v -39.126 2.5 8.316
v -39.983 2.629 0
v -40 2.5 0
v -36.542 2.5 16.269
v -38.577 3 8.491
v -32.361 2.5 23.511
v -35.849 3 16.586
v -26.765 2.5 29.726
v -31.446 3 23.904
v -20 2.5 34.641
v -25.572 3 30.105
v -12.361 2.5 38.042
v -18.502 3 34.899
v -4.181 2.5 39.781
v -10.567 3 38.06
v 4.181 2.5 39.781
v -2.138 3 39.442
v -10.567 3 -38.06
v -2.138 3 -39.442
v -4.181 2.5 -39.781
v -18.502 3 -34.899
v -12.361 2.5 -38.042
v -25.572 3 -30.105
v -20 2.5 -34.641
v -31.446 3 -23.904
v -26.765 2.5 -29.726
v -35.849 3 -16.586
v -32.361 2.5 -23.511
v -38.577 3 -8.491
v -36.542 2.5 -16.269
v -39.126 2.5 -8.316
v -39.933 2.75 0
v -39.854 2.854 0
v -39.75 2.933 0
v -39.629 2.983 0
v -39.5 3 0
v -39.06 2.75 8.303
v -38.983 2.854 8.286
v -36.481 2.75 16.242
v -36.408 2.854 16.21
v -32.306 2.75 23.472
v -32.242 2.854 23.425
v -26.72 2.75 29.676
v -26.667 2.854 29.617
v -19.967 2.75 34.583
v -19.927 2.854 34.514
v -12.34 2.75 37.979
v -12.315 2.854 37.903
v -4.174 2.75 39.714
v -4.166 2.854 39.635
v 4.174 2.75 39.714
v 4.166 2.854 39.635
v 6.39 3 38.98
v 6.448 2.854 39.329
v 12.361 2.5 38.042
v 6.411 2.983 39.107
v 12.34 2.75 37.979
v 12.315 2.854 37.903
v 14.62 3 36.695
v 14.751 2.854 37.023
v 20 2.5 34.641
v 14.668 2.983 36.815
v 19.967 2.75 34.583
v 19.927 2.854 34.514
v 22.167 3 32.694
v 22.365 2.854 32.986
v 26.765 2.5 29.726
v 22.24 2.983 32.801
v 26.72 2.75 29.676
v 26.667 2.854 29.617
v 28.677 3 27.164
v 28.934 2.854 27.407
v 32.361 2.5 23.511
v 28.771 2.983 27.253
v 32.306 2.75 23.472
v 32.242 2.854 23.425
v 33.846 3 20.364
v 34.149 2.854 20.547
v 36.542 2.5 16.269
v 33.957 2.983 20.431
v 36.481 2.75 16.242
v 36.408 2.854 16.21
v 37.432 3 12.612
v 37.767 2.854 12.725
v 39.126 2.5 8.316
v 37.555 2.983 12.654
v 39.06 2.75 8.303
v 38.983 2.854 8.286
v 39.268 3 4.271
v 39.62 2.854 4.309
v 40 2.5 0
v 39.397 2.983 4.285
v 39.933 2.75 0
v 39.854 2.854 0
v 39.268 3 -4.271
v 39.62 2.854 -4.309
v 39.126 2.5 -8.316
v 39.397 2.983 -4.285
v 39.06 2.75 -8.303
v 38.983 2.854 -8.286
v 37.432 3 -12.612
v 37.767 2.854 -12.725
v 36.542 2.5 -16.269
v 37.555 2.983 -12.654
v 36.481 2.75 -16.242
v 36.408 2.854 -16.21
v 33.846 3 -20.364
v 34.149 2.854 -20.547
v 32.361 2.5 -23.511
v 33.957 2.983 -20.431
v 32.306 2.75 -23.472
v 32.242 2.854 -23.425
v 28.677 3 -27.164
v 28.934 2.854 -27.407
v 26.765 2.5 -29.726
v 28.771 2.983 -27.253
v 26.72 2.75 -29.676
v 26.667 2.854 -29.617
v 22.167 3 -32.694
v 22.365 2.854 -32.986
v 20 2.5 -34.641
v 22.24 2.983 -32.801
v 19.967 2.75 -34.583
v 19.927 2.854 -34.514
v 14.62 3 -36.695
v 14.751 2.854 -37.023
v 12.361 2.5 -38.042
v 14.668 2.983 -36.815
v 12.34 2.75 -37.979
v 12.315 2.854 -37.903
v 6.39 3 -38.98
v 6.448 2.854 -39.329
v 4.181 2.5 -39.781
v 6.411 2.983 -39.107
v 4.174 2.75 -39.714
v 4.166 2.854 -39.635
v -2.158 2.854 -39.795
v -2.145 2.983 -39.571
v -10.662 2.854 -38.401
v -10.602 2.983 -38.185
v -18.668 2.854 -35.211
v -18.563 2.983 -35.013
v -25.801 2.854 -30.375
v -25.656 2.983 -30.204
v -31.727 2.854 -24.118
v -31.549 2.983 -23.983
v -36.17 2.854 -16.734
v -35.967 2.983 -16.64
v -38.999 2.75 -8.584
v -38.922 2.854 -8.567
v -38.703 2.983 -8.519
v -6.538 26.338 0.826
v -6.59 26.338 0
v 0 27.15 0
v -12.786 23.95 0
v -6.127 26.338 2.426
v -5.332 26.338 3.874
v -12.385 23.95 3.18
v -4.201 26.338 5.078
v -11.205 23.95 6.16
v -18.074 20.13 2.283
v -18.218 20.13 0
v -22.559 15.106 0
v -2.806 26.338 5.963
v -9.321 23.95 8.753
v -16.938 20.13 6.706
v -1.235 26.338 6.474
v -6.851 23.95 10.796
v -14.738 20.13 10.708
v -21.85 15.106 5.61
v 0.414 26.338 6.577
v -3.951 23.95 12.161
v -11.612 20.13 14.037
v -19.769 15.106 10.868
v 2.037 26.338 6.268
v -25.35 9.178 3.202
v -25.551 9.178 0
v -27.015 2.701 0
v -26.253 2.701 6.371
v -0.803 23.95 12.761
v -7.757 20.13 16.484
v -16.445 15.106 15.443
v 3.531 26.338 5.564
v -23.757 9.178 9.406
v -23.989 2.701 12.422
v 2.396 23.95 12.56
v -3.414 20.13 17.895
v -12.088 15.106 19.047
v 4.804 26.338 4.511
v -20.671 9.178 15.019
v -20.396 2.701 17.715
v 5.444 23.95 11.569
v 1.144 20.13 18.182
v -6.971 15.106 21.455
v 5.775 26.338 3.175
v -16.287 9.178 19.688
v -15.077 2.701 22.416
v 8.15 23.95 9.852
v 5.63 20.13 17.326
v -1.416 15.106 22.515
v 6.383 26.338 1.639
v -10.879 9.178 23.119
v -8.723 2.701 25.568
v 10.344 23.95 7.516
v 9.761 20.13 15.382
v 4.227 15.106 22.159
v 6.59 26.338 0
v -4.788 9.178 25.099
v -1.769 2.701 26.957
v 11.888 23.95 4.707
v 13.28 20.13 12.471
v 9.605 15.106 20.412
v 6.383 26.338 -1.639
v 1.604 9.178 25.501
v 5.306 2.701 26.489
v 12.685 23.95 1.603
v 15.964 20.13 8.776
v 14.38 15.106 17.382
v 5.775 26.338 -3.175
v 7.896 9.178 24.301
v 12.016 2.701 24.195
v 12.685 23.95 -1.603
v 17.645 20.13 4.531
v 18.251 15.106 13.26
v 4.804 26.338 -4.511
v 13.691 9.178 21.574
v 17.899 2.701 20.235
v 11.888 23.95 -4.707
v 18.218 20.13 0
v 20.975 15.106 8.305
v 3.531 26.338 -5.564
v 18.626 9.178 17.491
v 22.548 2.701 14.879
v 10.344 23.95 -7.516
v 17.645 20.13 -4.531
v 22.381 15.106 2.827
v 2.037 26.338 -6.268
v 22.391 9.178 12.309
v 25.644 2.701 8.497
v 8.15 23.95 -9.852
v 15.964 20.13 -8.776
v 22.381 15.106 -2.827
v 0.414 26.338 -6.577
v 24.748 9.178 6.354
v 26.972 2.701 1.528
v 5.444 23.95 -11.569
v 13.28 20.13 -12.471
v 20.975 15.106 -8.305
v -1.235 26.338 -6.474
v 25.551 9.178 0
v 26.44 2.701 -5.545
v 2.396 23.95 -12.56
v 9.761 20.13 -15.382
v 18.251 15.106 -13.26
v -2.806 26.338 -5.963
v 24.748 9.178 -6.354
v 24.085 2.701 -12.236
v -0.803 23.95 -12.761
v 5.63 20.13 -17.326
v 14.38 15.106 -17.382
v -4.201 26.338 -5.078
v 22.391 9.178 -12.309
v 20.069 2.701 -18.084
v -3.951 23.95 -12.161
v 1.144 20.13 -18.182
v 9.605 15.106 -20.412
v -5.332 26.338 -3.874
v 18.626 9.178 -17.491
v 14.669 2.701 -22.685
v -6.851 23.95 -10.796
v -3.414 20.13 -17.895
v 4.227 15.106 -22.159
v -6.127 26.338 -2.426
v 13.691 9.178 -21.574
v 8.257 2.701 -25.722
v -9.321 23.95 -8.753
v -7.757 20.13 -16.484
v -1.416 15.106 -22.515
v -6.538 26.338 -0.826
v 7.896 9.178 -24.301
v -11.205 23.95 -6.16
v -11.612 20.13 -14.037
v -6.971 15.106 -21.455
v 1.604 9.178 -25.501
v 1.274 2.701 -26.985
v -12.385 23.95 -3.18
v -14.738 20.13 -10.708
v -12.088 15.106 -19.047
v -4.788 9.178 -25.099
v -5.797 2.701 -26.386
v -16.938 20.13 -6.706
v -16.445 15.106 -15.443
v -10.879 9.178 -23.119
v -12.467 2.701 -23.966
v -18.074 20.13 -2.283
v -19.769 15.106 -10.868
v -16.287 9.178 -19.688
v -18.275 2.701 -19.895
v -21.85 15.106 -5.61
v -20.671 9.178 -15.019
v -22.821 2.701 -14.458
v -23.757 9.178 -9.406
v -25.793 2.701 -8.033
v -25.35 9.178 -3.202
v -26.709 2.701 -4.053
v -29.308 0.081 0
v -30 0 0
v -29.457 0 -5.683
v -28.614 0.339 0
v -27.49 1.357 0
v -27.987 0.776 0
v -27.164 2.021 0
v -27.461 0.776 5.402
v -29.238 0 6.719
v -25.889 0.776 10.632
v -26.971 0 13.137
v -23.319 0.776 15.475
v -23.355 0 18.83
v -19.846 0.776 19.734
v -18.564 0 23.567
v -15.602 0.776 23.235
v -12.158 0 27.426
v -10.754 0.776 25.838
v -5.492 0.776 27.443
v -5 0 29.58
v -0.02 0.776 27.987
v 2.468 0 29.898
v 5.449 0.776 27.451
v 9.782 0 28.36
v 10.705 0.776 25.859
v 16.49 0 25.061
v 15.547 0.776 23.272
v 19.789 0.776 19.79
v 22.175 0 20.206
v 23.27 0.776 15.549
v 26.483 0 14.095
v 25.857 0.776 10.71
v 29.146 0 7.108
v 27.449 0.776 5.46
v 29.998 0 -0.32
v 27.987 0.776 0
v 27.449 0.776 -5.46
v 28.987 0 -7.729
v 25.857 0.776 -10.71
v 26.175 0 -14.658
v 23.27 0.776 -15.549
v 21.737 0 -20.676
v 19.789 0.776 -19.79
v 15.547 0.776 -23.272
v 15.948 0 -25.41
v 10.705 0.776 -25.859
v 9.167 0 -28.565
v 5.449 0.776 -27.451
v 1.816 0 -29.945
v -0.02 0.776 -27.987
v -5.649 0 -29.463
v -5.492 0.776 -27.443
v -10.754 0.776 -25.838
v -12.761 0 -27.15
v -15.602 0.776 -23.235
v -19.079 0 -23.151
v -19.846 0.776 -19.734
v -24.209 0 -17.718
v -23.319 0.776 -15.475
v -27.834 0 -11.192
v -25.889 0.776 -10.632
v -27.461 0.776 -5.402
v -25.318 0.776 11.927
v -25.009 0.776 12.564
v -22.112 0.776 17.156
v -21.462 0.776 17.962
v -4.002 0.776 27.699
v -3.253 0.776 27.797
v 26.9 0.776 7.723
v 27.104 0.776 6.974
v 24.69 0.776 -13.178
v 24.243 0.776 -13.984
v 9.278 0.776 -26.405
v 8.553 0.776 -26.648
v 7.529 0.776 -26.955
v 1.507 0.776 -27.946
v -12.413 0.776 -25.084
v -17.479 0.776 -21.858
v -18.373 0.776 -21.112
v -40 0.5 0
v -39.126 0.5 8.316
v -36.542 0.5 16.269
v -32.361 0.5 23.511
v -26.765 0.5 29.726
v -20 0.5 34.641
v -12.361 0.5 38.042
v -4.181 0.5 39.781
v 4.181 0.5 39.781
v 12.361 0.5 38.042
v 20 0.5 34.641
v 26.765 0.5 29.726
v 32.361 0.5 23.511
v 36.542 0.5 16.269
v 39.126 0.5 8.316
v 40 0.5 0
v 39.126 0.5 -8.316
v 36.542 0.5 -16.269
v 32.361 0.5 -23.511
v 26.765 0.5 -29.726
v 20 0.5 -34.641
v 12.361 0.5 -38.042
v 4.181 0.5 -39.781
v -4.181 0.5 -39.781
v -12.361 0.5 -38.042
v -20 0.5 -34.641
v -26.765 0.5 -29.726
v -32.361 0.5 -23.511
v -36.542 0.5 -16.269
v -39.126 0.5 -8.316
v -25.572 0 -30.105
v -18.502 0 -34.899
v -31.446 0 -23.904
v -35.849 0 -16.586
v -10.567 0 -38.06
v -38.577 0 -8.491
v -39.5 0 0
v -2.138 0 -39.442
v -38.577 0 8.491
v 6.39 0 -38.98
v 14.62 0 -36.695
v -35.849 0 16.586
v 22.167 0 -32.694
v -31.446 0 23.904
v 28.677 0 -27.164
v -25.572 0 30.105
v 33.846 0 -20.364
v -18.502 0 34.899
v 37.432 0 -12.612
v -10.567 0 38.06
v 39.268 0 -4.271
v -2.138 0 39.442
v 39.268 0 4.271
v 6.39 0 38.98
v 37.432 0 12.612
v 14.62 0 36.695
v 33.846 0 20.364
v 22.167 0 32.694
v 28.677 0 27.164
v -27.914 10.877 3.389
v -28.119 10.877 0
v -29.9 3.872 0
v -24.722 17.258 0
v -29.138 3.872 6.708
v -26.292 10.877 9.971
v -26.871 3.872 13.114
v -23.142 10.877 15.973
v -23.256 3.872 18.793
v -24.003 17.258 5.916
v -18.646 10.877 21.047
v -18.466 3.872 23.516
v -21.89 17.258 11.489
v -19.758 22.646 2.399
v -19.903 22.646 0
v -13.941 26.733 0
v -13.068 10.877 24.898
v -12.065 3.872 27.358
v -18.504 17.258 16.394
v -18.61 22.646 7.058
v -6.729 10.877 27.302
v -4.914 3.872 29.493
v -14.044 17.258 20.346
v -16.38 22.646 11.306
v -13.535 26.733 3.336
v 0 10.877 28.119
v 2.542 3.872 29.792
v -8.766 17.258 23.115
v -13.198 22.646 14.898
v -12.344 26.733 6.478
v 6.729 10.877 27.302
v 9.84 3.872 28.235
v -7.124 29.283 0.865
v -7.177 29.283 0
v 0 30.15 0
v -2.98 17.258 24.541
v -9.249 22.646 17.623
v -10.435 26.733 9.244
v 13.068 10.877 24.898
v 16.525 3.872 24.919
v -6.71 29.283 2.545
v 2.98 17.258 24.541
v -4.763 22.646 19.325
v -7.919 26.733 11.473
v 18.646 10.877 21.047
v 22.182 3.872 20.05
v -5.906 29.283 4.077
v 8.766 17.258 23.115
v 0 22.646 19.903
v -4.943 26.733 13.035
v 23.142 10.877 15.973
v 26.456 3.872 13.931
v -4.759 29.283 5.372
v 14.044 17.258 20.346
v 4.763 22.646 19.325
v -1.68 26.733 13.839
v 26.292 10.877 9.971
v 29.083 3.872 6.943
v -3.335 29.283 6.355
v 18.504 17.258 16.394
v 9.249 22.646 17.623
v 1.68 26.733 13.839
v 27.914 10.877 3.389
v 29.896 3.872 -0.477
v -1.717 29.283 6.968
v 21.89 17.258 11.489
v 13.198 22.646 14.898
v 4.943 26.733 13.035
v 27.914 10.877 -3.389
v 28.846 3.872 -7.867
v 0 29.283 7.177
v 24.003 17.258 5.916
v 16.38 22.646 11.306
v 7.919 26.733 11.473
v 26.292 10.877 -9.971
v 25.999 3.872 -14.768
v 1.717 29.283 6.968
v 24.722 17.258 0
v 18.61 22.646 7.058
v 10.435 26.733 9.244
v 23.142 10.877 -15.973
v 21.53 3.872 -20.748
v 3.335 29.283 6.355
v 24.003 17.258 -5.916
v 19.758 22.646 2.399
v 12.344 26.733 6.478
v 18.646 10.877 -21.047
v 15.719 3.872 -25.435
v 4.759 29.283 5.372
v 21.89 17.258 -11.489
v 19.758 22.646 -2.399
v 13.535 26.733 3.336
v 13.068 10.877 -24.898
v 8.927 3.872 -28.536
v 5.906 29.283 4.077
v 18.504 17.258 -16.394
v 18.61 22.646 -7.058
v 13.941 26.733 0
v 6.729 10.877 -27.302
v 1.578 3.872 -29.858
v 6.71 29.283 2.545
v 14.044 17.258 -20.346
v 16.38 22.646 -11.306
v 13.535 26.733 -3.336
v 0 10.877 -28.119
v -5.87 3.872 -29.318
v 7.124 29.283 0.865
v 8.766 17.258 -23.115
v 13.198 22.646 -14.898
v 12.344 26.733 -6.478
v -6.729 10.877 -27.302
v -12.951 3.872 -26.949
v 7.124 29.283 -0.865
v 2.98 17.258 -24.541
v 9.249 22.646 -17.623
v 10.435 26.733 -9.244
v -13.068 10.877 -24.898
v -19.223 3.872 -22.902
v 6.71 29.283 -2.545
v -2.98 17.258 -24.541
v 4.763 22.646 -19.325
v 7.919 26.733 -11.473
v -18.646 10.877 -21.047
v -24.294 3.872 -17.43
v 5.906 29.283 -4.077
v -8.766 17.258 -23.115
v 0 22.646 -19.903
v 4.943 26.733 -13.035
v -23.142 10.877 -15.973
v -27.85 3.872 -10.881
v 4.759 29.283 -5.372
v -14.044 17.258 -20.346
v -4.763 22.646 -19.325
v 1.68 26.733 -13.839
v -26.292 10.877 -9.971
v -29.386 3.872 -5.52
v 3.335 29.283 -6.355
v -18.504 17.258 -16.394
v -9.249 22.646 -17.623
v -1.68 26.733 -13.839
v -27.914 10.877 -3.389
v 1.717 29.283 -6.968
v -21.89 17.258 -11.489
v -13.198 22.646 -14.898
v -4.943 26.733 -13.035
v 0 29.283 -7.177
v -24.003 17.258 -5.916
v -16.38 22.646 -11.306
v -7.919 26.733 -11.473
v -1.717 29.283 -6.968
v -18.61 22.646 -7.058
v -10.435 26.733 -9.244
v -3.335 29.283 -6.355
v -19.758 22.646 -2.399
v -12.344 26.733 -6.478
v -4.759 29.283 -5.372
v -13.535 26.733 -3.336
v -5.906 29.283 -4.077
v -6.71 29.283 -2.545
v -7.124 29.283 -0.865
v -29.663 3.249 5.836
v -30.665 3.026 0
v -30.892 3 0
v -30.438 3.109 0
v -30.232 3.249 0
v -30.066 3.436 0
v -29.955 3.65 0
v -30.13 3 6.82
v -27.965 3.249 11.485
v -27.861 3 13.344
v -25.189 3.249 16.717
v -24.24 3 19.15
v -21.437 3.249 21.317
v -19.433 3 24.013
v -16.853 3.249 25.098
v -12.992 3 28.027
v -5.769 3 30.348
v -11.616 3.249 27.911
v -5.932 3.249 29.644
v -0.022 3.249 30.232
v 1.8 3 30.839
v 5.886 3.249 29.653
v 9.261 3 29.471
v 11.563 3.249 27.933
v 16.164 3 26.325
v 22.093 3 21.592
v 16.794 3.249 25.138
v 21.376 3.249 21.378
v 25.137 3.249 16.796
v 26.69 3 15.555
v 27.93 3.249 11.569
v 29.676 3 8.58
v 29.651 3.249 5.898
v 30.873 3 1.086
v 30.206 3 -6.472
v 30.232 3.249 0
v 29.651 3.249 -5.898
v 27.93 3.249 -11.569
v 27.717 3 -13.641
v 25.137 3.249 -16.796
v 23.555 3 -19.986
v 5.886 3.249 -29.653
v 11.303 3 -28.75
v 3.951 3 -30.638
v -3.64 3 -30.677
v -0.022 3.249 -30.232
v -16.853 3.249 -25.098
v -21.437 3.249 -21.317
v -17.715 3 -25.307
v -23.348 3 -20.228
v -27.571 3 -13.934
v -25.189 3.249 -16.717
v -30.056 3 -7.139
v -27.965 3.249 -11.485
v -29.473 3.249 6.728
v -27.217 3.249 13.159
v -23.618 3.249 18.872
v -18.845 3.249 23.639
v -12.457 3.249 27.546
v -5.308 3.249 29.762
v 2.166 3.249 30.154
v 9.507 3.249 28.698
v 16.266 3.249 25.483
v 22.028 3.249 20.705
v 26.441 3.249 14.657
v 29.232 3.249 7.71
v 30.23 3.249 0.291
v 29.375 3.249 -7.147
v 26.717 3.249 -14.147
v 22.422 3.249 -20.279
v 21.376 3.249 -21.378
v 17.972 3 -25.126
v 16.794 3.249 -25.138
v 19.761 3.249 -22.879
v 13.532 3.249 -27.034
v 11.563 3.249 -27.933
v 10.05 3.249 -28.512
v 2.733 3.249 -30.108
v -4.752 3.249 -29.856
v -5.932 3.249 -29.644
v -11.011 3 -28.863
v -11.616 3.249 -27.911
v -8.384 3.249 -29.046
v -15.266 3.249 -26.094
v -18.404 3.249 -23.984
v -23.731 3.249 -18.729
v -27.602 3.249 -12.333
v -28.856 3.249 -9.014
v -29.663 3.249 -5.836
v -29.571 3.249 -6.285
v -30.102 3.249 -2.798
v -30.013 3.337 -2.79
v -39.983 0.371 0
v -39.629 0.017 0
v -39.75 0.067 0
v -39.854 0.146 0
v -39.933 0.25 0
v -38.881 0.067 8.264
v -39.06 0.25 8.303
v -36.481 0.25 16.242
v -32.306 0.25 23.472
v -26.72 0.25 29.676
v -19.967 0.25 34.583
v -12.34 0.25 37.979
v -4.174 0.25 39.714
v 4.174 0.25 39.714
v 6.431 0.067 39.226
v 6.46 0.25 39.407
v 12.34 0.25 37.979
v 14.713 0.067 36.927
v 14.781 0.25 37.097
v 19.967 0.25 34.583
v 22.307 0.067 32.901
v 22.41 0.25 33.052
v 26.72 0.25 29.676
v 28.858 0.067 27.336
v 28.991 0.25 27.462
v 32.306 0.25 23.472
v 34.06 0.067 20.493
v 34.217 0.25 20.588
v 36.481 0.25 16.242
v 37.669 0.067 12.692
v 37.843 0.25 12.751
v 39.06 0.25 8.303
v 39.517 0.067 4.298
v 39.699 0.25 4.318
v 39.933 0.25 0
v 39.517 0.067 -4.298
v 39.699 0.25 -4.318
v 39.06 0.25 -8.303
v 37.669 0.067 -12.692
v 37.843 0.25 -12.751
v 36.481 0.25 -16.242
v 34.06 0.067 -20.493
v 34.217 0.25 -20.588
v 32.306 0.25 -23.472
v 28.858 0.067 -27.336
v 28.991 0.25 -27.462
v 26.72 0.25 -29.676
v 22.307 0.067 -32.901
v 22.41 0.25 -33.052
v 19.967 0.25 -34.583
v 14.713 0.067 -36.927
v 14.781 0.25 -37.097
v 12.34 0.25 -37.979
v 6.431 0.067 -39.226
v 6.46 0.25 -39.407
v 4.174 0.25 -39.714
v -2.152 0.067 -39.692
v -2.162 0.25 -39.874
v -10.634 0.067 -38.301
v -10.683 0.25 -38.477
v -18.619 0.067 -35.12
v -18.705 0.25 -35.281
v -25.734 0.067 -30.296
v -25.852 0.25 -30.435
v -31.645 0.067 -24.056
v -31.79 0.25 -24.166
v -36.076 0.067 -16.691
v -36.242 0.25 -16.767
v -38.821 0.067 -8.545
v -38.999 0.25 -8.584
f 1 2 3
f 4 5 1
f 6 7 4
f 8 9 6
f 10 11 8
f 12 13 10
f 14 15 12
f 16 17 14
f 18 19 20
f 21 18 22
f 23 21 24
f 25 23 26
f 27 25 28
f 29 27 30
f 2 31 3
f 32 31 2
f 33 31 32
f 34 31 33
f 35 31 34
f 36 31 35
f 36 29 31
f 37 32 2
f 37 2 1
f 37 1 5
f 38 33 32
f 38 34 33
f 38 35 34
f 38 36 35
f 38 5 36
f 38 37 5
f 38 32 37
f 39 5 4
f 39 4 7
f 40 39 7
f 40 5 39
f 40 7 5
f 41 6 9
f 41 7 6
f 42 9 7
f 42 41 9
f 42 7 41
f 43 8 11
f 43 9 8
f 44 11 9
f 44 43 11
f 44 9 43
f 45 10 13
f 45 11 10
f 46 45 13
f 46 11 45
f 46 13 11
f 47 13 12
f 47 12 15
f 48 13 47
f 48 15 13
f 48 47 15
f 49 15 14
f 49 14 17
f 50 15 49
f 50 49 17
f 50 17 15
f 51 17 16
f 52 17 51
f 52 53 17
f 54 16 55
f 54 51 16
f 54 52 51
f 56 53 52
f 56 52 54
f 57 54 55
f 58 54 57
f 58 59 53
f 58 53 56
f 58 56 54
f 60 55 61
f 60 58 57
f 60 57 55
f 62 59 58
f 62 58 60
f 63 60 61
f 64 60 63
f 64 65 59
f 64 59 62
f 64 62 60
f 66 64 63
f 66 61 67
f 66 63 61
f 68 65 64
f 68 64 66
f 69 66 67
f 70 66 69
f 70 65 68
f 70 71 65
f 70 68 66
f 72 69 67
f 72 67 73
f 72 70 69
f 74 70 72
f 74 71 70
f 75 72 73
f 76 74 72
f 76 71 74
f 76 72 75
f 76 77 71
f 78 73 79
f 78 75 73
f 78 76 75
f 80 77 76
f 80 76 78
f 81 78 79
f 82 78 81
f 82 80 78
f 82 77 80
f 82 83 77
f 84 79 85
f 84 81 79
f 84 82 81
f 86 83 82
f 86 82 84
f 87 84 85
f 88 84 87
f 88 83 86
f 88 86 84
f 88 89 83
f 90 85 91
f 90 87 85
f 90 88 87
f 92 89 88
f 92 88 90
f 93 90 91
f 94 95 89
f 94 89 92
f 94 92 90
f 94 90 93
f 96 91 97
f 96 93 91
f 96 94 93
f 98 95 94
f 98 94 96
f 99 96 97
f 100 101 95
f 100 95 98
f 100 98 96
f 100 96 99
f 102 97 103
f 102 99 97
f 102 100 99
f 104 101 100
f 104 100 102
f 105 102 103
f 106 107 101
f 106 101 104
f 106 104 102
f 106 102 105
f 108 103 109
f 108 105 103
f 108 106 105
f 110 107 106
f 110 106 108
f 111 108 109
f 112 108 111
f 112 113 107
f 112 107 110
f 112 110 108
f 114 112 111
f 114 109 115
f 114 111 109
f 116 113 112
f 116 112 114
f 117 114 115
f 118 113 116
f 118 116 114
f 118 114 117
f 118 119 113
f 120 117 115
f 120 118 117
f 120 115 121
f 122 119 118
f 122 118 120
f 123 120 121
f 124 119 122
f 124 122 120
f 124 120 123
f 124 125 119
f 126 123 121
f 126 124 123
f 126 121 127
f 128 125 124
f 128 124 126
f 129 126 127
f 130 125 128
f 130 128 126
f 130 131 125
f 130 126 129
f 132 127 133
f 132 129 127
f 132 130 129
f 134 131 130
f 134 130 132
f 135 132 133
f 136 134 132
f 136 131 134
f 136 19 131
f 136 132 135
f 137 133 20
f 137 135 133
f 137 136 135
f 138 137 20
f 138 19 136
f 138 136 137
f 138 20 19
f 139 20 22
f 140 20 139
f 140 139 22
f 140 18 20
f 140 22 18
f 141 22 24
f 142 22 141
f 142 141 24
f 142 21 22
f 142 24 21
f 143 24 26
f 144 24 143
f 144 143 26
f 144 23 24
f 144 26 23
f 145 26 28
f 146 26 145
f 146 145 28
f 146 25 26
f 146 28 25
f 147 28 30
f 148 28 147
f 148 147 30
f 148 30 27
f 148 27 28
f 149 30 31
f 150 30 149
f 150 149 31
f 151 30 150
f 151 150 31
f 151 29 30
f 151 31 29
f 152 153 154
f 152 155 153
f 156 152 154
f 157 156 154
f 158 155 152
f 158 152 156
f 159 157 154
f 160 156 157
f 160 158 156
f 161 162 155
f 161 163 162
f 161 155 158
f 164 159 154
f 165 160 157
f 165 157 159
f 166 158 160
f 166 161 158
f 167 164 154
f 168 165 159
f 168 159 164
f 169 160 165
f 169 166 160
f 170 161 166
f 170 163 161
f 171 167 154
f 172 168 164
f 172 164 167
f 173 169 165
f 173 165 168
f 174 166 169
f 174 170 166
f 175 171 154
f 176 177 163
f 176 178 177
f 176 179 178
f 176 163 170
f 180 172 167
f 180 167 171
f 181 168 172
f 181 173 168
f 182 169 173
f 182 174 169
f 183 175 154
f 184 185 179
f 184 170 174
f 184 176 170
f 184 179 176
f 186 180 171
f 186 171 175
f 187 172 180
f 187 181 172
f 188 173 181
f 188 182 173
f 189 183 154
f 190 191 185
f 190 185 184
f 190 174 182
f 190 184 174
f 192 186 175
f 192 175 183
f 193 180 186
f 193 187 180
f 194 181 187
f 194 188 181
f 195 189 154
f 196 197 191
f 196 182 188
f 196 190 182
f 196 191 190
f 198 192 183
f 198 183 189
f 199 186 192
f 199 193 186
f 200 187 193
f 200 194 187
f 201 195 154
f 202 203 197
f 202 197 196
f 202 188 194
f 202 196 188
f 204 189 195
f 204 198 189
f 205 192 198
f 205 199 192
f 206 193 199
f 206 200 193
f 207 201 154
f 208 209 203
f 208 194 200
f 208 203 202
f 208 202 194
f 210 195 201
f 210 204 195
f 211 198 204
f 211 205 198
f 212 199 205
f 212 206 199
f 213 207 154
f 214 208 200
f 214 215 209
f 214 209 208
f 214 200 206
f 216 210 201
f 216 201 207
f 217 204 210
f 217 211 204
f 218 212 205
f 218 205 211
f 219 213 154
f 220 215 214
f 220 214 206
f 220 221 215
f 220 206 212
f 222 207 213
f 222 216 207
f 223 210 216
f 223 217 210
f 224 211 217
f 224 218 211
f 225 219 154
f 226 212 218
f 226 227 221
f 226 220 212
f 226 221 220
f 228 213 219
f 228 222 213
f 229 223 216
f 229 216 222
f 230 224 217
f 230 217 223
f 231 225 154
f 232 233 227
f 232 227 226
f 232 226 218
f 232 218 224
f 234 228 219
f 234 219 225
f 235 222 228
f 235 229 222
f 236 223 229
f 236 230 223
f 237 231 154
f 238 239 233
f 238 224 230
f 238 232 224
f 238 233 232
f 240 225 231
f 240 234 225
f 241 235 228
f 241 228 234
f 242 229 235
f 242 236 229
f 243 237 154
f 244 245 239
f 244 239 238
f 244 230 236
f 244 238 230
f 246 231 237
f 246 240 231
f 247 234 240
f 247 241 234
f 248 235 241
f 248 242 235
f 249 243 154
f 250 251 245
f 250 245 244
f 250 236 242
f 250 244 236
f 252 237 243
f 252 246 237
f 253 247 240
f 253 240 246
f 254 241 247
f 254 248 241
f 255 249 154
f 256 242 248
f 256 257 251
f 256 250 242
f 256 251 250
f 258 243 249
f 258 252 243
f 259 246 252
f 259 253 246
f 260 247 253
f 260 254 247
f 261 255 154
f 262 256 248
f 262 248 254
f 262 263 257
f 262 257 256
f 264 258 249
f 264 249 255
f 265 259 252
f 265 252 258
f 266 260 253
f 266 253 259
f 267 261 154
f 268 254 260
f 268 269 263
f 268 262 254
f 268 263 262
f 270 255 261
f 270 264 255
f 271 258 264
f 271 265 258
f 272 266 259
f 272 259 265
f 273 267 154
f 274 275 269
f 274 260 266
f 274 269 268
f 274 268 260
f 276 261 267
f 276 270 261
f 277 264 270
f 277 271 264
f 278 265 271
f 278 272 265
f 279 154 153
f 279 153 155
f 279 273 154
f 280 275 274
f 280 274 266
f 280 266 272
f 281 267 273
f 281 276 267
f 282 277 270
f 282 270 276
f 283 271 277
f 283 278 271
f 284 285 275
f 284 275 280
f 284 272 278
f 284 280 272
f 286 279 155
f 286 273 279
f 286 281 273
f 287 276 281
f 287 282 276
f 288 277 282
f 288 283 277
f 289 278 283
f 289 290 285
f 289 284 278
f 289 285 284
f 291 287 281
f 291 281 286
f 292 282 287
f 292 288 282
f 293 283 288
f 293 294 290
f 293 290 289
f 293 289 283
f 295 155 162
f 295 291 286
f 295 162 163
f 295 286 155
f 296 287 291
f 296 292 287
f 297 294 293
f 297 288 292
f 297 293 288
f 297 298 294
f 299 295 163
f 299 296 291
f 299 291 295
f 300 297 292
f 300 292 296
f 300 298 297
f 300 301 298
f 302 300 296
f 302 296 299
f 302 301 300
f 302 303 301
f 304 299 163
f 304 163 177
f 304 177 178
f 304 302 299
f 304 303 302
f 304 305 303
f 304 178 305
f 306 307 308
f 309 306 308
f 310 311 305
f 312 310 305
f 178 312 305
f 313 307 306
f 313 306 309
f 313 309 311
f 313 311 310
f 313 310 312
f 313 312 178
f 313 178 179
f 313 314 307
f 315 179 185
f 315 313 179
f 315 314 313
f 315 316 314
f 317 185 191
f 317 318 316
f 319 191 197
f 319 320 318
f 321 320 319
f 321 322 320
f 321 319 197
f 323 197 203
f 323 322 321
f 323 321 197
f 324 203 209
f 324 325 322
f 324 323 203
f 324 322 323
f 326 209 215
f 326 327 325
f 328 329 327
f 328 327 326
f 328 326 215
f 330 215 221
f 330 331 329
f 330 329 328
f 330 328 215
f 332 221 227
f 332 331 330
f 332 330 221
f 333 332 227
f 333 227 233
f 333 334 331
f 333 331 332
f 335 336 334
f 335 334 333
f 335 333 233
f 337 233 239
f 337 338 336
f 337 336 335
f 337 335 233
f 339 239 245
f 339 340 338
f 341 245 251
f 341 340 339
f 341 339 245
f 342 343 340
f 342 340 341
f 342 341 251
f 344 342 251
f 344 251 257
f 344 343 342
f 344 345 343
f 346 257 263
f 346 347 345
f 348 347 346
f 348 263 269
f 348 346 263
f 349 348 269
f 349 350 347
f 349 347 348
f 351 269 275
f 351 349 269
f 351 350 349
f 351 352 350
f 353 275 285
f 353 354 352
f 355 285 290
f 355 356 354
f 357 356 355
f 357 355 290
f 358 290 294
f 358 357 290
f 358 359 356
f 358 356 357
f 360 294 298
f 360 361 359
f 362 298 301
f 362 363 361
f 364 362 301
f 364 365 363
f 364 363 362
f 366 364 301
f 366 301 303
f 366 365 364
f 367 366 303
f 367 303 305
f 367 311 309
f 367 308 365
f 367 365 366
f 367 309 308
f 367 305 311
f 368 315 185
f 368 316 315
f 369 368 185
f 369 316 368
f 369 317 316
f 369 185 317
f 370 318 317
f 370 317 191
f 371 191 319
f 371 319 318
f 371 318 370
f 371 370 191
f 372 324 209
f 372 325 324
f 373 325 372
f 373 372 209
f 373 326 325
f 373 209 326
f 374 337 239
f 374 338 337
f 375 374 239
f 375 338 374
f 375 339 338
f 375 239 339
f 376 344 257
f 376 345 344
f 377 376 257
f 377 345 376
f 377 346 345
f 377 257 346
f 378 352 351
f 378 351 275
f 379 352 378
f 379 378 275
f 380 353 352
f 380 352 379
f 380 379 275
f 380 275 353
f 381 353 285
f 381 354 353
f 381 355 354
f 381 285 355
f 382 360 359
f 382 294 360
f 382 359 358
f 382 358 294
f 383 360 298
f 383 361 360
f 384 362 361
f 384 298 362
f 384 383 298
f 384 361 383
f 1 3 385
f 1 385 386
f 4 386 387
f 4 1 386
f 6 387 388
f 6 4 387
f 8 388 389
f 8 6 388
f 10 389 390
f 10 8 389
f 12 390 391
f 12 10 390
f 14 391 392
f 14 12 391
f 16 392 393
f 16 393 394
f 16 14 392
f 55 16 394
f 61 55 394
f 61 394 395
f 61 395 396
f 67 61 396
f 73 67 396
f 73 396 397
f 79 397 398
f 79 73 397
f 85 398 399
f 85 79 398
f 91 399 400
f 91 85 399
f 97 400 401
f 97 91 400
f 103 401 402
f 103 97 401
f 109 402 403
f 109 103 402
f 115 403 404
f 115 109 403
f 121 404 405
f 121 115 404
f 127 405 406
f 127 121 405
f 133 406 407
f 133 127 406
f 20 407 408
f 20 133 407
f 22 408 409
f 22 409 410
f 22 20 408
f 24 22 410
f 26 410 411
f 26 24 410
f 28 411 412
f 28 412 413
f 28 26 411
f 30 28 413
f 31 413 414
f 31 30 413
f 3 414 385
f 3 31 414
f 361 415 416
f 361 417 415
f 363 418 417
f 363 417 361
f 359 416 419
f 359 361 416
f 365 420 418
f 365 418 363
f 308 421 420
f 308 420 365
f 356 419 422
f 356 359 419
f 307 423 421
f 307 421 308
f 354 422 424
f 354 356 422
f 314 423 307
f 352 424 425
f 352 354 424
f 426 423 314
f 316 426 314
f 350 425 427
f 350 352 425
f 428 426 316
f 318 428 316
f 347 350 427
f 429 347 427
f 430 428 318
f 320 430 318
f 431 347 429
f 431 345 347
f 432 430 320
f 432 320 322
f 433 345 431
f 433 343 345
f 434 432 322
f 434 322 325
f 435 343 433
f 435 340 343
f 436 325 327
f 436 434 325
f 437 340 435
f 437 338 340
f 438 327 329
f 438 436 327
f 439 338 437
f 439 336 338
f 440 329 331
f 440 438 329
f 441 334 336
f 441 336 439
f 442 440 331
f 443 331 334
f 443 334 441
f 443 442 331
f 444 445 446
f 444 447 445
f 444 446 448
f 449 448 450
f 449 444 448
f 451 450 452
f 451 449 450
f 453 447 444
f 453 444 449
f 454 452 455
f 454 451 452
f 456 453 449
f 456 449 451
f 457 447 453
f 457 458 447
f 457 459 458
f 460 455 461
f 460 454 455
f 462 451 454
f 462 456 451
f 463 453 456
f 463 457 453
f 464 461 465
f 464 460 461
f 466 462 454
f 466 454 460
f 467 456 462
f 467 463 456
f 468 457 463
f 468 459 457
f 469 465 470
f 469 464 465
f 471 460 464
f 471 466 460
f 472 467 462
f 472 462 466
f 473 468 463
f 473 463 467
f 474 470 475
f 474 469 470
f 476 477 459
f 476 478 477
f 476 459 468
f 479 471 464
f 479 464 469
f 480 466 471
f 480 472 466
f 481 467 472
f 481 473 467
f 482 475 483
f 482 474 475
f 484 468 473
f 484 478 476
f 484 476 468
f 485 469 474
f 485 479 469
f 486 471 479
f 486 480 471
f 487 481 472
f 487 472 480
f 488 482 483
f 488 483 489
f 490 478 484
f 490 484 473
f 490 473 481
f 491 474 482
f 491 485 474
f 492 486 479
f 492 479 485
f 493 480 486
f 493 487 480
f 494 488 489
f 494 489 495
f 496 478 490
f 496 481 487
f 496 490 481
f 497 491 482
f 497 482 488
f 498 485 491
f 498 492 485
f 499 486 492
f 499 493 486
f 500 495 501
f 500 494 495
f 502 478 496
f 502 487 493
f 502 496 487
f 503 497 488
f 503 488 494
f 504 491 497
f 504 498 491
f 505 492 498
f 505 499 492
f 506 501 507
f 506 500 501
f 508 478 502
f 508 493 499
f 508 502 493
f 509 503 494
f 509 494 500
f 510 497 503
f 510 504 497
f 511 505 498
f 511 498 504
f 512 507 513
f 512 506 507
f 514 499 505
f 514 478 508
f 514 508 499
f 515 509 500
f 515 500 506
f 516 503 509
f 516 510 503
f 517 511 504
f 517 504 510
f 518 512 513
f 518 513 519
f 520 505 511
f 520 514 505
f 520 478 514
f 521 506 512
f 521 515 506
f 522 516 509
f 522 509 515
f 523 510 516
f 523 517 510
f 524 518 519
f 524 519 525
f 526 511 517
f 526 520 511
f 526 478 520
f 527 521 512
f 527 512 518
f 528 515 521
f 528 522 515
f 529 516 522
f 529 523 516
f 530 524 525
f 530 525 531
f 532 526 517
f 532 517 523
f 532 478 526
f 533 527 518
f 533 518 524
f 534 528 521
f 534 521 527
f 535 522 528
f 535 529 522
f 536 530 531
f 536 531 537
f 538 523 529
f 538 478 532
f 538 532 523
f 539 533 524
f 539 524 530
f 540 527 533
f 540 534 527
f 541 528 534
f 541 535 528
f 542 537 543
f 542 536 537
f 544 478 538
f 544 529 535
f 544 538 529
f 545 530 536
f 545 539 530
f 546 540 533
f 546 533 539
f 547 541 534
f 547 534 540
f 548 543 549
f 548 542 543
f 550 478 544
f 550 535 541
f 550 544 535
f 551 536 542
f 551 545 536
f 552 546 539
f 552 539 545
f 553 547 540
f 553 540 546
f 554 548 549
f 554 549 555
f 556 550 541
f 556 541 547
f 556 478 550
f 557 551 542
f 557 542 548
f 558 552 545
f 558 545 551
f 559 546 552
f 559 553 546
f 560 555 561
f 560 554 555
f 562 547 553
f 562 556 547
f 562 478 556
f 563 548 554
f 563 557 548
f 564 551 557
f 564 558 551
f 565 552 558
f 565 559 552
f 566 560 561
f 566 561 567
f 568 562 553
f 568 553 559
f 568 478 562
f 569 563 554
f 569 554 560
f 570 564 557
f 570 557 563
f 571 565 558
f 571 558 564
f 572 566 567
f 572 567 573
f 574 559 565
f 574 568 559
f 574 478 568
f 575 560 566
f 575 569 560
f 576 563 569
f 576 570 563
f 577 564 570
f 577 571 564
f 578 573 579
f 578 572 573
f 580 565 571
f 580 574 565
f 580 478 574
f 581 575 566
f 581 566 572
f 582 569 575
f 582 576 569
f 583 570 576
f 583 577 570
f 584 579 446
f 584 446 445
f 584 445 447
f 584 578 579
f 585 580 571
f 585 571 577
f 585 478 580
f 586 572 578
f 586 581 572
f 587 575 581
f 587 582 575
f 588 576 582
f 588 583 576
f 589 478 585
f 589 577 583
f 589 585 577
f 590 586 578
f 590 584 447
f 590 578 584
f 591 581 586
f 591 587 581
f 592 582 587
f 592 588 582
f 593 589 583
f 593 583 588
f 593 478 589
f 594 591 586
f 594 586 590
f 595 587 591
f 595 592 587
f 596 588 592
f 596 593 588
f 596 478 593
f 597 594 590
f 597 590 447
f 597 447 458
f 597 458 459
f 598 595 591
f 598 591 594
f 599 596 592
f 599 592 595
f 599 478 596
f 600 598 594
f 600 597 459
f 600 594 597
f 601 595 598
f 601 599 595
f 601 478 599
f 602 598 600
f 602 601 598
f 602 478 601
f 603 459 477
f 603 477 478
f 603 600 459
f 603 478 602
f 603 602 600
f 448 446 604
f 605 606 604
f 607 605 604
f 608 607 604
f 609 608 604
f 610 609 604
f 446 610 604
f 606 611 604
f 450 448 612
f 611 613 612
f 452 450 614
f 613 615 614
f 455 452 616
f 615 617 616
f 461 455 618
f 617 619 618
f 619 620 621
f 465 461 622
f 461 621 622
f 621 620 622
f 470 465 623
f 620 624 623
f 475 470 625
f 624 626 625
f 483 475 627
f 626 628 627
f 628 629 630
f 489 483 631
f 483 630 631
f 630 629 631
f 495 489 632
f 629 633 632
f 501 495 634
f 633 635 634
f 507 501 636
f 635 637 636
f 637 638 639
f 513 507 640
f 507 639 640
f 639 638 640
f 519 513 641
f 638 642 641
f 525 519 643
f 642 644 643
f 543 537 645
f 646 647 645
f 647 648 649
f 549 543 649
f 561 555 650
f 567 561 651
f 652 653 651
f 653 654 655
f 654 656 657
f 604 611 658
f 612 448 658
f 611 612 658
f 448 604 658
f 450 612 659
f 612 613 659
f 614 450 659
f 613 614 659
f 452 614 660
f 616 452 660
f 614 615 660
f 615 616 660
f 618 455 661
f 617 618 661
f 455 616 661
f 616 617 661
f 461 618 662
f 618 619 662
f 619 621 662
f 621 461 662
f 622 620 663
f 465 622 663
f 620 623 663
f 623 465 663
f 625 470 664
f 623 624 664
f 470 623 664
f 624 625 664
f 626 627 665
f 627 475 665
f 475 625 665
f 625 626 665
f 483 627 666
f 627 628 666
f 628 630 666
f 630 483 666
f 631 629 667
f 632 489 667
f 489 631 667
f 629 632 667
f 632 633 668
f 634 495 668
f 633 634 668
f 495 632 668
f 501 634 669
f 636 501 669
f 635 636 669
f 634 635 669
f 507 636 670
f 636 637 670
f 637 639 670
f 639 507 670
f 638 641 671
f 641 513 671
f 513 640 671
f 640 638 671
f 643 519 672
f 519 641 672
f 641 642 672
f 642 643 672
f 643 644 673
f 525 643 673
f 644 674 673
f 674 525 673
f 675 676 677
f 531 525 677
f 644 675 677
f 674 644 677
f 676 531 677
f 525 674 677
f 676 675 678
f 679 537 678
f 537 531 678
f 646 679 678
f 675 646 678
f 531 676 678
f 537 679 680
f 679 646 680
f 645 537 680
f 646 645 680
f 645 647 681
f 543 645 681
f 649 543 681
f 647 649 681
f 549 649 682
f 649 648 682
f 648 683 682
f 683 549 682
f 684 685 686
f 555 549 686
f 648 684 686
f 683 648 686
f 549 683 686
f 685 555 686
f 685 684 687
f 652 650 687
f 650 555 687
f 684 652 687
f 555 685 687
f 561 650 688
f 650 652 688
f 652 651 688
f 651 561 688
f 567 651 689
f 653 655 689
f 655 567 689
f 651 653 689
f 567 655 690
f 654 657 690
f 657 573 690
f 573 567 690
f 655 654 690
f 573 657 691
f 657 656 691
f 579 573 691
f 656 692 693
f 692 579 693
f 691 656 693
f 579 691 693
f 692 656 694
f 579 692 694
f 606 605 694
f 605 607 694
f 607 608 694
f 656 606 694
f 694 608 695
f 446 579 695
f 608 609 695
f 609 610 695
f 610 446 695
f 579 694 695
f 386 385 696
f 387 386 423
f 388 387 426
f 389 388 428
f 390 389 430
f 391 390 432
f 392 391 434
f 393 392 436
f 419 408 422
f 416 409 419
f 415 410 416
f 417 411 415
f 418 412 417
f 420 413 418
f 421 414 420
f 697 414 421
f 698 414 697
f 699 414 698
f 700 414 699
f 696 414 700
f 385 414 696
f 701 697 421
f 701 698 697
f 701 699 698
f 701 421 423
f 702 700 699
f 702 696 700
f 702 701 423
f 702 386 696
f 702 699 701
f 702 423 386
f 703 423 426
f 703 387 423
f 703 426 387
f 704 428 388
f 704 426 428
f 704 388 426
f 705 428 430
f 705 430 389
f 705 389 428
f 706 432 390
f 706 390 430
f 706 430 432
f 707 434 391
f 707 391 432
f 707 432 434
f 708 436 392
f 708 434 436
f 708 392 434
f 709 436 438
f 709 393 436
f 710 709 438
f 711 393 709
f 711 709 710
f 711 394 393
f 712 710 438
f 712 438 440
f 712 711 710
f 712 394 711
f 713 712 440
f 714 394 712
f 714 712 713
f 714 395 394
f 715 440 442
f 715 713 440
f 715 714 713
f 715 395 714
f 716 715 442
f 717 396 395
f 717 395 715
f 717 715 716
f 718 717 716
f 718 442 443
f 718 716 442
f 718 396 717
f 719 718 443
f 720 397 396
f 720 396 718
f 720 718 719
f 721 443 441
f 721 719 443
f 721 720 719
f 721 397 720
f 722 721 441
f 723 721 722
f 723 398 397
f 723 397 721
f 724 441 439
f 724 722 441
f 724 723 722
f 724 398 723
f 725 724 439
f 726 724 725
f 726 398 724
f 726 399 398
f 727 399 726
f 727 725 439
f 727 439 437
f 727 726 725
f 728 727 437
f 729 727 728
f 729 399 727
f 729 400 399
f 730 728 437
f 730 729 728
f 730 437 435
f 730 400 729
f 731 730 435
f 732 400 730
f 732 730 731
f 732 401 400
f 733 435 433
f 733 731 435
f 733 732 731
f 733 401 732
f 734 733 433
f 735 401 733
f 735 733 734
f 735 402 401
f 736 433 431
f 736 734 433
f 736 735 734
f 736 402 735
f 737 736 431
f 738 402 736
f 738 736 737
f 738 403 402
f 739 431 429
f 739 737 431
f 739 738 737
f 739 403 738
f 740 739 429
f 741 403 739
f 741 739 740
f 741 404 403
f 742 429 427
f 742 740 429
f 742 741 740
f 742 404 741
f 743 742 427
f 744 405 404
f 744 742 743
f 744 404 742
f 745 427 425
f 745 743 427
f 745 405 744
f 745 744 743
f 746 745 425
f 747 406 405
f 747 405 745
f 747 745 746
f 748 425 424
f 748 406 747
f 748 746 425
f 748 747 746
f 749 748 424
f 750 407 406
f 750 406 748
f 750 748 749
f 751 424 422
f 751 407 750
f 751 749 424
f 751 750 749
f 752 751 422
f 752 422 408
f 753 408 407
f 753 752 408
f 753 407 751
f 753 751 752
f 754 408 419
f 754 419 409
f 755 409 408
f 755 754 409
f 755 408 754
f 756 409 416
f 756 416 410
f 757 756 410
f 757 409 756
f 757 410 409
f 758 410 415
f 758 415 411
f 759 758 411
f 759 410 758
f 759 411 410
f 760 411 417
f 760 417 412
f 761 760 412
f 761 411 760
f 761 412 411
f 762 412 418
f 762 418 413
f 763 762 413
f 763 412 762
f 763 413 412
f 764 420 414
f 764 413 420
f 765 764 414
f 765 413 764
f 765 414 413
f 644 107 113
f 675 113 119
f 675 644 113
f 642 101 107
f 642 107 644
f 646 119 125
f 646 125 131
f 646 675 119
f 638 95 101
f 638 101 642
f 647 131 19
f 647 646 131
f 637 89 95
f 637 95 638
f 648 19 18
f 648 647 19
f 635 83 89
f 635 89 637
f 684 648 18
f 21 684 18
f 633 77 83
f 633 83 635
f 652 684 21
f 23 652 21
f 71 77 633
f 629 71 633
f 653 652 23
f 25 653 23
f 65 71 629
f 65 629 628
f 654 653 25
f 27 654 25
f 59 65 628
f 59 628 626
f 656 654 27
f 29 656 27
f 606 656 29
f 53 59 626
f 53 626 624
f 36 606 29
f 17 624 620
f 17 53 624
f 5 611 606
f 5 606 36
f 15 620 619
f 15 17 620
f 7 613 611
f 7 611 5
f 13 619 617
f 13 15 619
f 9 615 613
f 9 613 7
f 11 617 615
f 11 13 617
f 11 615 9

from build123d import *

# Parameters (mm, degrees)
FILLET_1_R = 1
FILLET_2_R = 3
FILLET_3_R = 0.5


with BuildPart() as part:
    # 草图1 → 旋转4 (revolve)
    with BuildSketch(Plane.XY):
        with BuildLine():
            Line((-27.149626863, 0), (-40, 0))
            Line((-40, 0), (-40, 3))
            Line((-40, 3), (-30, 3))
            ThreePointArc((-30, 3), (-20.230560044, 22.354517223), (0, 30.149626863))
            Line((0, 30.149626863), (0, 27.149626863))
            ThreePointArc((0, 27.149626863), (-19.197685262, 19.197685262), (-27.149626863, 0))
        make_face()
    revolve(axis=Axis((0, 27.149626863, 0), (0, 1, 0)))

    # 圆角1
    fillet_1_edges = [part.edges().sort_by_distance(p)[0] for p in [
        (30, 3, 0),
    ]]
    fillet(fillet_1_edges, radius=FILLET_1_R)

    # 圆角2
    fillet_2_edges = [part.edges().sort_by_distance(p)[0] for p in [
        (27.149626863, 0, 0),
    ]]
    fillet(fillet_2_edges, radius=FILLET_2_R)

    # 圆角3
    fillet_3_edges = [part.edges().sort_by_distance(p)[0] for p in [
        (40, 3, 0),
        (40, 0, 0),
    ]]
    fillet(fillet_3_edges, radius=FILLET_3_R)


solid = part.part
